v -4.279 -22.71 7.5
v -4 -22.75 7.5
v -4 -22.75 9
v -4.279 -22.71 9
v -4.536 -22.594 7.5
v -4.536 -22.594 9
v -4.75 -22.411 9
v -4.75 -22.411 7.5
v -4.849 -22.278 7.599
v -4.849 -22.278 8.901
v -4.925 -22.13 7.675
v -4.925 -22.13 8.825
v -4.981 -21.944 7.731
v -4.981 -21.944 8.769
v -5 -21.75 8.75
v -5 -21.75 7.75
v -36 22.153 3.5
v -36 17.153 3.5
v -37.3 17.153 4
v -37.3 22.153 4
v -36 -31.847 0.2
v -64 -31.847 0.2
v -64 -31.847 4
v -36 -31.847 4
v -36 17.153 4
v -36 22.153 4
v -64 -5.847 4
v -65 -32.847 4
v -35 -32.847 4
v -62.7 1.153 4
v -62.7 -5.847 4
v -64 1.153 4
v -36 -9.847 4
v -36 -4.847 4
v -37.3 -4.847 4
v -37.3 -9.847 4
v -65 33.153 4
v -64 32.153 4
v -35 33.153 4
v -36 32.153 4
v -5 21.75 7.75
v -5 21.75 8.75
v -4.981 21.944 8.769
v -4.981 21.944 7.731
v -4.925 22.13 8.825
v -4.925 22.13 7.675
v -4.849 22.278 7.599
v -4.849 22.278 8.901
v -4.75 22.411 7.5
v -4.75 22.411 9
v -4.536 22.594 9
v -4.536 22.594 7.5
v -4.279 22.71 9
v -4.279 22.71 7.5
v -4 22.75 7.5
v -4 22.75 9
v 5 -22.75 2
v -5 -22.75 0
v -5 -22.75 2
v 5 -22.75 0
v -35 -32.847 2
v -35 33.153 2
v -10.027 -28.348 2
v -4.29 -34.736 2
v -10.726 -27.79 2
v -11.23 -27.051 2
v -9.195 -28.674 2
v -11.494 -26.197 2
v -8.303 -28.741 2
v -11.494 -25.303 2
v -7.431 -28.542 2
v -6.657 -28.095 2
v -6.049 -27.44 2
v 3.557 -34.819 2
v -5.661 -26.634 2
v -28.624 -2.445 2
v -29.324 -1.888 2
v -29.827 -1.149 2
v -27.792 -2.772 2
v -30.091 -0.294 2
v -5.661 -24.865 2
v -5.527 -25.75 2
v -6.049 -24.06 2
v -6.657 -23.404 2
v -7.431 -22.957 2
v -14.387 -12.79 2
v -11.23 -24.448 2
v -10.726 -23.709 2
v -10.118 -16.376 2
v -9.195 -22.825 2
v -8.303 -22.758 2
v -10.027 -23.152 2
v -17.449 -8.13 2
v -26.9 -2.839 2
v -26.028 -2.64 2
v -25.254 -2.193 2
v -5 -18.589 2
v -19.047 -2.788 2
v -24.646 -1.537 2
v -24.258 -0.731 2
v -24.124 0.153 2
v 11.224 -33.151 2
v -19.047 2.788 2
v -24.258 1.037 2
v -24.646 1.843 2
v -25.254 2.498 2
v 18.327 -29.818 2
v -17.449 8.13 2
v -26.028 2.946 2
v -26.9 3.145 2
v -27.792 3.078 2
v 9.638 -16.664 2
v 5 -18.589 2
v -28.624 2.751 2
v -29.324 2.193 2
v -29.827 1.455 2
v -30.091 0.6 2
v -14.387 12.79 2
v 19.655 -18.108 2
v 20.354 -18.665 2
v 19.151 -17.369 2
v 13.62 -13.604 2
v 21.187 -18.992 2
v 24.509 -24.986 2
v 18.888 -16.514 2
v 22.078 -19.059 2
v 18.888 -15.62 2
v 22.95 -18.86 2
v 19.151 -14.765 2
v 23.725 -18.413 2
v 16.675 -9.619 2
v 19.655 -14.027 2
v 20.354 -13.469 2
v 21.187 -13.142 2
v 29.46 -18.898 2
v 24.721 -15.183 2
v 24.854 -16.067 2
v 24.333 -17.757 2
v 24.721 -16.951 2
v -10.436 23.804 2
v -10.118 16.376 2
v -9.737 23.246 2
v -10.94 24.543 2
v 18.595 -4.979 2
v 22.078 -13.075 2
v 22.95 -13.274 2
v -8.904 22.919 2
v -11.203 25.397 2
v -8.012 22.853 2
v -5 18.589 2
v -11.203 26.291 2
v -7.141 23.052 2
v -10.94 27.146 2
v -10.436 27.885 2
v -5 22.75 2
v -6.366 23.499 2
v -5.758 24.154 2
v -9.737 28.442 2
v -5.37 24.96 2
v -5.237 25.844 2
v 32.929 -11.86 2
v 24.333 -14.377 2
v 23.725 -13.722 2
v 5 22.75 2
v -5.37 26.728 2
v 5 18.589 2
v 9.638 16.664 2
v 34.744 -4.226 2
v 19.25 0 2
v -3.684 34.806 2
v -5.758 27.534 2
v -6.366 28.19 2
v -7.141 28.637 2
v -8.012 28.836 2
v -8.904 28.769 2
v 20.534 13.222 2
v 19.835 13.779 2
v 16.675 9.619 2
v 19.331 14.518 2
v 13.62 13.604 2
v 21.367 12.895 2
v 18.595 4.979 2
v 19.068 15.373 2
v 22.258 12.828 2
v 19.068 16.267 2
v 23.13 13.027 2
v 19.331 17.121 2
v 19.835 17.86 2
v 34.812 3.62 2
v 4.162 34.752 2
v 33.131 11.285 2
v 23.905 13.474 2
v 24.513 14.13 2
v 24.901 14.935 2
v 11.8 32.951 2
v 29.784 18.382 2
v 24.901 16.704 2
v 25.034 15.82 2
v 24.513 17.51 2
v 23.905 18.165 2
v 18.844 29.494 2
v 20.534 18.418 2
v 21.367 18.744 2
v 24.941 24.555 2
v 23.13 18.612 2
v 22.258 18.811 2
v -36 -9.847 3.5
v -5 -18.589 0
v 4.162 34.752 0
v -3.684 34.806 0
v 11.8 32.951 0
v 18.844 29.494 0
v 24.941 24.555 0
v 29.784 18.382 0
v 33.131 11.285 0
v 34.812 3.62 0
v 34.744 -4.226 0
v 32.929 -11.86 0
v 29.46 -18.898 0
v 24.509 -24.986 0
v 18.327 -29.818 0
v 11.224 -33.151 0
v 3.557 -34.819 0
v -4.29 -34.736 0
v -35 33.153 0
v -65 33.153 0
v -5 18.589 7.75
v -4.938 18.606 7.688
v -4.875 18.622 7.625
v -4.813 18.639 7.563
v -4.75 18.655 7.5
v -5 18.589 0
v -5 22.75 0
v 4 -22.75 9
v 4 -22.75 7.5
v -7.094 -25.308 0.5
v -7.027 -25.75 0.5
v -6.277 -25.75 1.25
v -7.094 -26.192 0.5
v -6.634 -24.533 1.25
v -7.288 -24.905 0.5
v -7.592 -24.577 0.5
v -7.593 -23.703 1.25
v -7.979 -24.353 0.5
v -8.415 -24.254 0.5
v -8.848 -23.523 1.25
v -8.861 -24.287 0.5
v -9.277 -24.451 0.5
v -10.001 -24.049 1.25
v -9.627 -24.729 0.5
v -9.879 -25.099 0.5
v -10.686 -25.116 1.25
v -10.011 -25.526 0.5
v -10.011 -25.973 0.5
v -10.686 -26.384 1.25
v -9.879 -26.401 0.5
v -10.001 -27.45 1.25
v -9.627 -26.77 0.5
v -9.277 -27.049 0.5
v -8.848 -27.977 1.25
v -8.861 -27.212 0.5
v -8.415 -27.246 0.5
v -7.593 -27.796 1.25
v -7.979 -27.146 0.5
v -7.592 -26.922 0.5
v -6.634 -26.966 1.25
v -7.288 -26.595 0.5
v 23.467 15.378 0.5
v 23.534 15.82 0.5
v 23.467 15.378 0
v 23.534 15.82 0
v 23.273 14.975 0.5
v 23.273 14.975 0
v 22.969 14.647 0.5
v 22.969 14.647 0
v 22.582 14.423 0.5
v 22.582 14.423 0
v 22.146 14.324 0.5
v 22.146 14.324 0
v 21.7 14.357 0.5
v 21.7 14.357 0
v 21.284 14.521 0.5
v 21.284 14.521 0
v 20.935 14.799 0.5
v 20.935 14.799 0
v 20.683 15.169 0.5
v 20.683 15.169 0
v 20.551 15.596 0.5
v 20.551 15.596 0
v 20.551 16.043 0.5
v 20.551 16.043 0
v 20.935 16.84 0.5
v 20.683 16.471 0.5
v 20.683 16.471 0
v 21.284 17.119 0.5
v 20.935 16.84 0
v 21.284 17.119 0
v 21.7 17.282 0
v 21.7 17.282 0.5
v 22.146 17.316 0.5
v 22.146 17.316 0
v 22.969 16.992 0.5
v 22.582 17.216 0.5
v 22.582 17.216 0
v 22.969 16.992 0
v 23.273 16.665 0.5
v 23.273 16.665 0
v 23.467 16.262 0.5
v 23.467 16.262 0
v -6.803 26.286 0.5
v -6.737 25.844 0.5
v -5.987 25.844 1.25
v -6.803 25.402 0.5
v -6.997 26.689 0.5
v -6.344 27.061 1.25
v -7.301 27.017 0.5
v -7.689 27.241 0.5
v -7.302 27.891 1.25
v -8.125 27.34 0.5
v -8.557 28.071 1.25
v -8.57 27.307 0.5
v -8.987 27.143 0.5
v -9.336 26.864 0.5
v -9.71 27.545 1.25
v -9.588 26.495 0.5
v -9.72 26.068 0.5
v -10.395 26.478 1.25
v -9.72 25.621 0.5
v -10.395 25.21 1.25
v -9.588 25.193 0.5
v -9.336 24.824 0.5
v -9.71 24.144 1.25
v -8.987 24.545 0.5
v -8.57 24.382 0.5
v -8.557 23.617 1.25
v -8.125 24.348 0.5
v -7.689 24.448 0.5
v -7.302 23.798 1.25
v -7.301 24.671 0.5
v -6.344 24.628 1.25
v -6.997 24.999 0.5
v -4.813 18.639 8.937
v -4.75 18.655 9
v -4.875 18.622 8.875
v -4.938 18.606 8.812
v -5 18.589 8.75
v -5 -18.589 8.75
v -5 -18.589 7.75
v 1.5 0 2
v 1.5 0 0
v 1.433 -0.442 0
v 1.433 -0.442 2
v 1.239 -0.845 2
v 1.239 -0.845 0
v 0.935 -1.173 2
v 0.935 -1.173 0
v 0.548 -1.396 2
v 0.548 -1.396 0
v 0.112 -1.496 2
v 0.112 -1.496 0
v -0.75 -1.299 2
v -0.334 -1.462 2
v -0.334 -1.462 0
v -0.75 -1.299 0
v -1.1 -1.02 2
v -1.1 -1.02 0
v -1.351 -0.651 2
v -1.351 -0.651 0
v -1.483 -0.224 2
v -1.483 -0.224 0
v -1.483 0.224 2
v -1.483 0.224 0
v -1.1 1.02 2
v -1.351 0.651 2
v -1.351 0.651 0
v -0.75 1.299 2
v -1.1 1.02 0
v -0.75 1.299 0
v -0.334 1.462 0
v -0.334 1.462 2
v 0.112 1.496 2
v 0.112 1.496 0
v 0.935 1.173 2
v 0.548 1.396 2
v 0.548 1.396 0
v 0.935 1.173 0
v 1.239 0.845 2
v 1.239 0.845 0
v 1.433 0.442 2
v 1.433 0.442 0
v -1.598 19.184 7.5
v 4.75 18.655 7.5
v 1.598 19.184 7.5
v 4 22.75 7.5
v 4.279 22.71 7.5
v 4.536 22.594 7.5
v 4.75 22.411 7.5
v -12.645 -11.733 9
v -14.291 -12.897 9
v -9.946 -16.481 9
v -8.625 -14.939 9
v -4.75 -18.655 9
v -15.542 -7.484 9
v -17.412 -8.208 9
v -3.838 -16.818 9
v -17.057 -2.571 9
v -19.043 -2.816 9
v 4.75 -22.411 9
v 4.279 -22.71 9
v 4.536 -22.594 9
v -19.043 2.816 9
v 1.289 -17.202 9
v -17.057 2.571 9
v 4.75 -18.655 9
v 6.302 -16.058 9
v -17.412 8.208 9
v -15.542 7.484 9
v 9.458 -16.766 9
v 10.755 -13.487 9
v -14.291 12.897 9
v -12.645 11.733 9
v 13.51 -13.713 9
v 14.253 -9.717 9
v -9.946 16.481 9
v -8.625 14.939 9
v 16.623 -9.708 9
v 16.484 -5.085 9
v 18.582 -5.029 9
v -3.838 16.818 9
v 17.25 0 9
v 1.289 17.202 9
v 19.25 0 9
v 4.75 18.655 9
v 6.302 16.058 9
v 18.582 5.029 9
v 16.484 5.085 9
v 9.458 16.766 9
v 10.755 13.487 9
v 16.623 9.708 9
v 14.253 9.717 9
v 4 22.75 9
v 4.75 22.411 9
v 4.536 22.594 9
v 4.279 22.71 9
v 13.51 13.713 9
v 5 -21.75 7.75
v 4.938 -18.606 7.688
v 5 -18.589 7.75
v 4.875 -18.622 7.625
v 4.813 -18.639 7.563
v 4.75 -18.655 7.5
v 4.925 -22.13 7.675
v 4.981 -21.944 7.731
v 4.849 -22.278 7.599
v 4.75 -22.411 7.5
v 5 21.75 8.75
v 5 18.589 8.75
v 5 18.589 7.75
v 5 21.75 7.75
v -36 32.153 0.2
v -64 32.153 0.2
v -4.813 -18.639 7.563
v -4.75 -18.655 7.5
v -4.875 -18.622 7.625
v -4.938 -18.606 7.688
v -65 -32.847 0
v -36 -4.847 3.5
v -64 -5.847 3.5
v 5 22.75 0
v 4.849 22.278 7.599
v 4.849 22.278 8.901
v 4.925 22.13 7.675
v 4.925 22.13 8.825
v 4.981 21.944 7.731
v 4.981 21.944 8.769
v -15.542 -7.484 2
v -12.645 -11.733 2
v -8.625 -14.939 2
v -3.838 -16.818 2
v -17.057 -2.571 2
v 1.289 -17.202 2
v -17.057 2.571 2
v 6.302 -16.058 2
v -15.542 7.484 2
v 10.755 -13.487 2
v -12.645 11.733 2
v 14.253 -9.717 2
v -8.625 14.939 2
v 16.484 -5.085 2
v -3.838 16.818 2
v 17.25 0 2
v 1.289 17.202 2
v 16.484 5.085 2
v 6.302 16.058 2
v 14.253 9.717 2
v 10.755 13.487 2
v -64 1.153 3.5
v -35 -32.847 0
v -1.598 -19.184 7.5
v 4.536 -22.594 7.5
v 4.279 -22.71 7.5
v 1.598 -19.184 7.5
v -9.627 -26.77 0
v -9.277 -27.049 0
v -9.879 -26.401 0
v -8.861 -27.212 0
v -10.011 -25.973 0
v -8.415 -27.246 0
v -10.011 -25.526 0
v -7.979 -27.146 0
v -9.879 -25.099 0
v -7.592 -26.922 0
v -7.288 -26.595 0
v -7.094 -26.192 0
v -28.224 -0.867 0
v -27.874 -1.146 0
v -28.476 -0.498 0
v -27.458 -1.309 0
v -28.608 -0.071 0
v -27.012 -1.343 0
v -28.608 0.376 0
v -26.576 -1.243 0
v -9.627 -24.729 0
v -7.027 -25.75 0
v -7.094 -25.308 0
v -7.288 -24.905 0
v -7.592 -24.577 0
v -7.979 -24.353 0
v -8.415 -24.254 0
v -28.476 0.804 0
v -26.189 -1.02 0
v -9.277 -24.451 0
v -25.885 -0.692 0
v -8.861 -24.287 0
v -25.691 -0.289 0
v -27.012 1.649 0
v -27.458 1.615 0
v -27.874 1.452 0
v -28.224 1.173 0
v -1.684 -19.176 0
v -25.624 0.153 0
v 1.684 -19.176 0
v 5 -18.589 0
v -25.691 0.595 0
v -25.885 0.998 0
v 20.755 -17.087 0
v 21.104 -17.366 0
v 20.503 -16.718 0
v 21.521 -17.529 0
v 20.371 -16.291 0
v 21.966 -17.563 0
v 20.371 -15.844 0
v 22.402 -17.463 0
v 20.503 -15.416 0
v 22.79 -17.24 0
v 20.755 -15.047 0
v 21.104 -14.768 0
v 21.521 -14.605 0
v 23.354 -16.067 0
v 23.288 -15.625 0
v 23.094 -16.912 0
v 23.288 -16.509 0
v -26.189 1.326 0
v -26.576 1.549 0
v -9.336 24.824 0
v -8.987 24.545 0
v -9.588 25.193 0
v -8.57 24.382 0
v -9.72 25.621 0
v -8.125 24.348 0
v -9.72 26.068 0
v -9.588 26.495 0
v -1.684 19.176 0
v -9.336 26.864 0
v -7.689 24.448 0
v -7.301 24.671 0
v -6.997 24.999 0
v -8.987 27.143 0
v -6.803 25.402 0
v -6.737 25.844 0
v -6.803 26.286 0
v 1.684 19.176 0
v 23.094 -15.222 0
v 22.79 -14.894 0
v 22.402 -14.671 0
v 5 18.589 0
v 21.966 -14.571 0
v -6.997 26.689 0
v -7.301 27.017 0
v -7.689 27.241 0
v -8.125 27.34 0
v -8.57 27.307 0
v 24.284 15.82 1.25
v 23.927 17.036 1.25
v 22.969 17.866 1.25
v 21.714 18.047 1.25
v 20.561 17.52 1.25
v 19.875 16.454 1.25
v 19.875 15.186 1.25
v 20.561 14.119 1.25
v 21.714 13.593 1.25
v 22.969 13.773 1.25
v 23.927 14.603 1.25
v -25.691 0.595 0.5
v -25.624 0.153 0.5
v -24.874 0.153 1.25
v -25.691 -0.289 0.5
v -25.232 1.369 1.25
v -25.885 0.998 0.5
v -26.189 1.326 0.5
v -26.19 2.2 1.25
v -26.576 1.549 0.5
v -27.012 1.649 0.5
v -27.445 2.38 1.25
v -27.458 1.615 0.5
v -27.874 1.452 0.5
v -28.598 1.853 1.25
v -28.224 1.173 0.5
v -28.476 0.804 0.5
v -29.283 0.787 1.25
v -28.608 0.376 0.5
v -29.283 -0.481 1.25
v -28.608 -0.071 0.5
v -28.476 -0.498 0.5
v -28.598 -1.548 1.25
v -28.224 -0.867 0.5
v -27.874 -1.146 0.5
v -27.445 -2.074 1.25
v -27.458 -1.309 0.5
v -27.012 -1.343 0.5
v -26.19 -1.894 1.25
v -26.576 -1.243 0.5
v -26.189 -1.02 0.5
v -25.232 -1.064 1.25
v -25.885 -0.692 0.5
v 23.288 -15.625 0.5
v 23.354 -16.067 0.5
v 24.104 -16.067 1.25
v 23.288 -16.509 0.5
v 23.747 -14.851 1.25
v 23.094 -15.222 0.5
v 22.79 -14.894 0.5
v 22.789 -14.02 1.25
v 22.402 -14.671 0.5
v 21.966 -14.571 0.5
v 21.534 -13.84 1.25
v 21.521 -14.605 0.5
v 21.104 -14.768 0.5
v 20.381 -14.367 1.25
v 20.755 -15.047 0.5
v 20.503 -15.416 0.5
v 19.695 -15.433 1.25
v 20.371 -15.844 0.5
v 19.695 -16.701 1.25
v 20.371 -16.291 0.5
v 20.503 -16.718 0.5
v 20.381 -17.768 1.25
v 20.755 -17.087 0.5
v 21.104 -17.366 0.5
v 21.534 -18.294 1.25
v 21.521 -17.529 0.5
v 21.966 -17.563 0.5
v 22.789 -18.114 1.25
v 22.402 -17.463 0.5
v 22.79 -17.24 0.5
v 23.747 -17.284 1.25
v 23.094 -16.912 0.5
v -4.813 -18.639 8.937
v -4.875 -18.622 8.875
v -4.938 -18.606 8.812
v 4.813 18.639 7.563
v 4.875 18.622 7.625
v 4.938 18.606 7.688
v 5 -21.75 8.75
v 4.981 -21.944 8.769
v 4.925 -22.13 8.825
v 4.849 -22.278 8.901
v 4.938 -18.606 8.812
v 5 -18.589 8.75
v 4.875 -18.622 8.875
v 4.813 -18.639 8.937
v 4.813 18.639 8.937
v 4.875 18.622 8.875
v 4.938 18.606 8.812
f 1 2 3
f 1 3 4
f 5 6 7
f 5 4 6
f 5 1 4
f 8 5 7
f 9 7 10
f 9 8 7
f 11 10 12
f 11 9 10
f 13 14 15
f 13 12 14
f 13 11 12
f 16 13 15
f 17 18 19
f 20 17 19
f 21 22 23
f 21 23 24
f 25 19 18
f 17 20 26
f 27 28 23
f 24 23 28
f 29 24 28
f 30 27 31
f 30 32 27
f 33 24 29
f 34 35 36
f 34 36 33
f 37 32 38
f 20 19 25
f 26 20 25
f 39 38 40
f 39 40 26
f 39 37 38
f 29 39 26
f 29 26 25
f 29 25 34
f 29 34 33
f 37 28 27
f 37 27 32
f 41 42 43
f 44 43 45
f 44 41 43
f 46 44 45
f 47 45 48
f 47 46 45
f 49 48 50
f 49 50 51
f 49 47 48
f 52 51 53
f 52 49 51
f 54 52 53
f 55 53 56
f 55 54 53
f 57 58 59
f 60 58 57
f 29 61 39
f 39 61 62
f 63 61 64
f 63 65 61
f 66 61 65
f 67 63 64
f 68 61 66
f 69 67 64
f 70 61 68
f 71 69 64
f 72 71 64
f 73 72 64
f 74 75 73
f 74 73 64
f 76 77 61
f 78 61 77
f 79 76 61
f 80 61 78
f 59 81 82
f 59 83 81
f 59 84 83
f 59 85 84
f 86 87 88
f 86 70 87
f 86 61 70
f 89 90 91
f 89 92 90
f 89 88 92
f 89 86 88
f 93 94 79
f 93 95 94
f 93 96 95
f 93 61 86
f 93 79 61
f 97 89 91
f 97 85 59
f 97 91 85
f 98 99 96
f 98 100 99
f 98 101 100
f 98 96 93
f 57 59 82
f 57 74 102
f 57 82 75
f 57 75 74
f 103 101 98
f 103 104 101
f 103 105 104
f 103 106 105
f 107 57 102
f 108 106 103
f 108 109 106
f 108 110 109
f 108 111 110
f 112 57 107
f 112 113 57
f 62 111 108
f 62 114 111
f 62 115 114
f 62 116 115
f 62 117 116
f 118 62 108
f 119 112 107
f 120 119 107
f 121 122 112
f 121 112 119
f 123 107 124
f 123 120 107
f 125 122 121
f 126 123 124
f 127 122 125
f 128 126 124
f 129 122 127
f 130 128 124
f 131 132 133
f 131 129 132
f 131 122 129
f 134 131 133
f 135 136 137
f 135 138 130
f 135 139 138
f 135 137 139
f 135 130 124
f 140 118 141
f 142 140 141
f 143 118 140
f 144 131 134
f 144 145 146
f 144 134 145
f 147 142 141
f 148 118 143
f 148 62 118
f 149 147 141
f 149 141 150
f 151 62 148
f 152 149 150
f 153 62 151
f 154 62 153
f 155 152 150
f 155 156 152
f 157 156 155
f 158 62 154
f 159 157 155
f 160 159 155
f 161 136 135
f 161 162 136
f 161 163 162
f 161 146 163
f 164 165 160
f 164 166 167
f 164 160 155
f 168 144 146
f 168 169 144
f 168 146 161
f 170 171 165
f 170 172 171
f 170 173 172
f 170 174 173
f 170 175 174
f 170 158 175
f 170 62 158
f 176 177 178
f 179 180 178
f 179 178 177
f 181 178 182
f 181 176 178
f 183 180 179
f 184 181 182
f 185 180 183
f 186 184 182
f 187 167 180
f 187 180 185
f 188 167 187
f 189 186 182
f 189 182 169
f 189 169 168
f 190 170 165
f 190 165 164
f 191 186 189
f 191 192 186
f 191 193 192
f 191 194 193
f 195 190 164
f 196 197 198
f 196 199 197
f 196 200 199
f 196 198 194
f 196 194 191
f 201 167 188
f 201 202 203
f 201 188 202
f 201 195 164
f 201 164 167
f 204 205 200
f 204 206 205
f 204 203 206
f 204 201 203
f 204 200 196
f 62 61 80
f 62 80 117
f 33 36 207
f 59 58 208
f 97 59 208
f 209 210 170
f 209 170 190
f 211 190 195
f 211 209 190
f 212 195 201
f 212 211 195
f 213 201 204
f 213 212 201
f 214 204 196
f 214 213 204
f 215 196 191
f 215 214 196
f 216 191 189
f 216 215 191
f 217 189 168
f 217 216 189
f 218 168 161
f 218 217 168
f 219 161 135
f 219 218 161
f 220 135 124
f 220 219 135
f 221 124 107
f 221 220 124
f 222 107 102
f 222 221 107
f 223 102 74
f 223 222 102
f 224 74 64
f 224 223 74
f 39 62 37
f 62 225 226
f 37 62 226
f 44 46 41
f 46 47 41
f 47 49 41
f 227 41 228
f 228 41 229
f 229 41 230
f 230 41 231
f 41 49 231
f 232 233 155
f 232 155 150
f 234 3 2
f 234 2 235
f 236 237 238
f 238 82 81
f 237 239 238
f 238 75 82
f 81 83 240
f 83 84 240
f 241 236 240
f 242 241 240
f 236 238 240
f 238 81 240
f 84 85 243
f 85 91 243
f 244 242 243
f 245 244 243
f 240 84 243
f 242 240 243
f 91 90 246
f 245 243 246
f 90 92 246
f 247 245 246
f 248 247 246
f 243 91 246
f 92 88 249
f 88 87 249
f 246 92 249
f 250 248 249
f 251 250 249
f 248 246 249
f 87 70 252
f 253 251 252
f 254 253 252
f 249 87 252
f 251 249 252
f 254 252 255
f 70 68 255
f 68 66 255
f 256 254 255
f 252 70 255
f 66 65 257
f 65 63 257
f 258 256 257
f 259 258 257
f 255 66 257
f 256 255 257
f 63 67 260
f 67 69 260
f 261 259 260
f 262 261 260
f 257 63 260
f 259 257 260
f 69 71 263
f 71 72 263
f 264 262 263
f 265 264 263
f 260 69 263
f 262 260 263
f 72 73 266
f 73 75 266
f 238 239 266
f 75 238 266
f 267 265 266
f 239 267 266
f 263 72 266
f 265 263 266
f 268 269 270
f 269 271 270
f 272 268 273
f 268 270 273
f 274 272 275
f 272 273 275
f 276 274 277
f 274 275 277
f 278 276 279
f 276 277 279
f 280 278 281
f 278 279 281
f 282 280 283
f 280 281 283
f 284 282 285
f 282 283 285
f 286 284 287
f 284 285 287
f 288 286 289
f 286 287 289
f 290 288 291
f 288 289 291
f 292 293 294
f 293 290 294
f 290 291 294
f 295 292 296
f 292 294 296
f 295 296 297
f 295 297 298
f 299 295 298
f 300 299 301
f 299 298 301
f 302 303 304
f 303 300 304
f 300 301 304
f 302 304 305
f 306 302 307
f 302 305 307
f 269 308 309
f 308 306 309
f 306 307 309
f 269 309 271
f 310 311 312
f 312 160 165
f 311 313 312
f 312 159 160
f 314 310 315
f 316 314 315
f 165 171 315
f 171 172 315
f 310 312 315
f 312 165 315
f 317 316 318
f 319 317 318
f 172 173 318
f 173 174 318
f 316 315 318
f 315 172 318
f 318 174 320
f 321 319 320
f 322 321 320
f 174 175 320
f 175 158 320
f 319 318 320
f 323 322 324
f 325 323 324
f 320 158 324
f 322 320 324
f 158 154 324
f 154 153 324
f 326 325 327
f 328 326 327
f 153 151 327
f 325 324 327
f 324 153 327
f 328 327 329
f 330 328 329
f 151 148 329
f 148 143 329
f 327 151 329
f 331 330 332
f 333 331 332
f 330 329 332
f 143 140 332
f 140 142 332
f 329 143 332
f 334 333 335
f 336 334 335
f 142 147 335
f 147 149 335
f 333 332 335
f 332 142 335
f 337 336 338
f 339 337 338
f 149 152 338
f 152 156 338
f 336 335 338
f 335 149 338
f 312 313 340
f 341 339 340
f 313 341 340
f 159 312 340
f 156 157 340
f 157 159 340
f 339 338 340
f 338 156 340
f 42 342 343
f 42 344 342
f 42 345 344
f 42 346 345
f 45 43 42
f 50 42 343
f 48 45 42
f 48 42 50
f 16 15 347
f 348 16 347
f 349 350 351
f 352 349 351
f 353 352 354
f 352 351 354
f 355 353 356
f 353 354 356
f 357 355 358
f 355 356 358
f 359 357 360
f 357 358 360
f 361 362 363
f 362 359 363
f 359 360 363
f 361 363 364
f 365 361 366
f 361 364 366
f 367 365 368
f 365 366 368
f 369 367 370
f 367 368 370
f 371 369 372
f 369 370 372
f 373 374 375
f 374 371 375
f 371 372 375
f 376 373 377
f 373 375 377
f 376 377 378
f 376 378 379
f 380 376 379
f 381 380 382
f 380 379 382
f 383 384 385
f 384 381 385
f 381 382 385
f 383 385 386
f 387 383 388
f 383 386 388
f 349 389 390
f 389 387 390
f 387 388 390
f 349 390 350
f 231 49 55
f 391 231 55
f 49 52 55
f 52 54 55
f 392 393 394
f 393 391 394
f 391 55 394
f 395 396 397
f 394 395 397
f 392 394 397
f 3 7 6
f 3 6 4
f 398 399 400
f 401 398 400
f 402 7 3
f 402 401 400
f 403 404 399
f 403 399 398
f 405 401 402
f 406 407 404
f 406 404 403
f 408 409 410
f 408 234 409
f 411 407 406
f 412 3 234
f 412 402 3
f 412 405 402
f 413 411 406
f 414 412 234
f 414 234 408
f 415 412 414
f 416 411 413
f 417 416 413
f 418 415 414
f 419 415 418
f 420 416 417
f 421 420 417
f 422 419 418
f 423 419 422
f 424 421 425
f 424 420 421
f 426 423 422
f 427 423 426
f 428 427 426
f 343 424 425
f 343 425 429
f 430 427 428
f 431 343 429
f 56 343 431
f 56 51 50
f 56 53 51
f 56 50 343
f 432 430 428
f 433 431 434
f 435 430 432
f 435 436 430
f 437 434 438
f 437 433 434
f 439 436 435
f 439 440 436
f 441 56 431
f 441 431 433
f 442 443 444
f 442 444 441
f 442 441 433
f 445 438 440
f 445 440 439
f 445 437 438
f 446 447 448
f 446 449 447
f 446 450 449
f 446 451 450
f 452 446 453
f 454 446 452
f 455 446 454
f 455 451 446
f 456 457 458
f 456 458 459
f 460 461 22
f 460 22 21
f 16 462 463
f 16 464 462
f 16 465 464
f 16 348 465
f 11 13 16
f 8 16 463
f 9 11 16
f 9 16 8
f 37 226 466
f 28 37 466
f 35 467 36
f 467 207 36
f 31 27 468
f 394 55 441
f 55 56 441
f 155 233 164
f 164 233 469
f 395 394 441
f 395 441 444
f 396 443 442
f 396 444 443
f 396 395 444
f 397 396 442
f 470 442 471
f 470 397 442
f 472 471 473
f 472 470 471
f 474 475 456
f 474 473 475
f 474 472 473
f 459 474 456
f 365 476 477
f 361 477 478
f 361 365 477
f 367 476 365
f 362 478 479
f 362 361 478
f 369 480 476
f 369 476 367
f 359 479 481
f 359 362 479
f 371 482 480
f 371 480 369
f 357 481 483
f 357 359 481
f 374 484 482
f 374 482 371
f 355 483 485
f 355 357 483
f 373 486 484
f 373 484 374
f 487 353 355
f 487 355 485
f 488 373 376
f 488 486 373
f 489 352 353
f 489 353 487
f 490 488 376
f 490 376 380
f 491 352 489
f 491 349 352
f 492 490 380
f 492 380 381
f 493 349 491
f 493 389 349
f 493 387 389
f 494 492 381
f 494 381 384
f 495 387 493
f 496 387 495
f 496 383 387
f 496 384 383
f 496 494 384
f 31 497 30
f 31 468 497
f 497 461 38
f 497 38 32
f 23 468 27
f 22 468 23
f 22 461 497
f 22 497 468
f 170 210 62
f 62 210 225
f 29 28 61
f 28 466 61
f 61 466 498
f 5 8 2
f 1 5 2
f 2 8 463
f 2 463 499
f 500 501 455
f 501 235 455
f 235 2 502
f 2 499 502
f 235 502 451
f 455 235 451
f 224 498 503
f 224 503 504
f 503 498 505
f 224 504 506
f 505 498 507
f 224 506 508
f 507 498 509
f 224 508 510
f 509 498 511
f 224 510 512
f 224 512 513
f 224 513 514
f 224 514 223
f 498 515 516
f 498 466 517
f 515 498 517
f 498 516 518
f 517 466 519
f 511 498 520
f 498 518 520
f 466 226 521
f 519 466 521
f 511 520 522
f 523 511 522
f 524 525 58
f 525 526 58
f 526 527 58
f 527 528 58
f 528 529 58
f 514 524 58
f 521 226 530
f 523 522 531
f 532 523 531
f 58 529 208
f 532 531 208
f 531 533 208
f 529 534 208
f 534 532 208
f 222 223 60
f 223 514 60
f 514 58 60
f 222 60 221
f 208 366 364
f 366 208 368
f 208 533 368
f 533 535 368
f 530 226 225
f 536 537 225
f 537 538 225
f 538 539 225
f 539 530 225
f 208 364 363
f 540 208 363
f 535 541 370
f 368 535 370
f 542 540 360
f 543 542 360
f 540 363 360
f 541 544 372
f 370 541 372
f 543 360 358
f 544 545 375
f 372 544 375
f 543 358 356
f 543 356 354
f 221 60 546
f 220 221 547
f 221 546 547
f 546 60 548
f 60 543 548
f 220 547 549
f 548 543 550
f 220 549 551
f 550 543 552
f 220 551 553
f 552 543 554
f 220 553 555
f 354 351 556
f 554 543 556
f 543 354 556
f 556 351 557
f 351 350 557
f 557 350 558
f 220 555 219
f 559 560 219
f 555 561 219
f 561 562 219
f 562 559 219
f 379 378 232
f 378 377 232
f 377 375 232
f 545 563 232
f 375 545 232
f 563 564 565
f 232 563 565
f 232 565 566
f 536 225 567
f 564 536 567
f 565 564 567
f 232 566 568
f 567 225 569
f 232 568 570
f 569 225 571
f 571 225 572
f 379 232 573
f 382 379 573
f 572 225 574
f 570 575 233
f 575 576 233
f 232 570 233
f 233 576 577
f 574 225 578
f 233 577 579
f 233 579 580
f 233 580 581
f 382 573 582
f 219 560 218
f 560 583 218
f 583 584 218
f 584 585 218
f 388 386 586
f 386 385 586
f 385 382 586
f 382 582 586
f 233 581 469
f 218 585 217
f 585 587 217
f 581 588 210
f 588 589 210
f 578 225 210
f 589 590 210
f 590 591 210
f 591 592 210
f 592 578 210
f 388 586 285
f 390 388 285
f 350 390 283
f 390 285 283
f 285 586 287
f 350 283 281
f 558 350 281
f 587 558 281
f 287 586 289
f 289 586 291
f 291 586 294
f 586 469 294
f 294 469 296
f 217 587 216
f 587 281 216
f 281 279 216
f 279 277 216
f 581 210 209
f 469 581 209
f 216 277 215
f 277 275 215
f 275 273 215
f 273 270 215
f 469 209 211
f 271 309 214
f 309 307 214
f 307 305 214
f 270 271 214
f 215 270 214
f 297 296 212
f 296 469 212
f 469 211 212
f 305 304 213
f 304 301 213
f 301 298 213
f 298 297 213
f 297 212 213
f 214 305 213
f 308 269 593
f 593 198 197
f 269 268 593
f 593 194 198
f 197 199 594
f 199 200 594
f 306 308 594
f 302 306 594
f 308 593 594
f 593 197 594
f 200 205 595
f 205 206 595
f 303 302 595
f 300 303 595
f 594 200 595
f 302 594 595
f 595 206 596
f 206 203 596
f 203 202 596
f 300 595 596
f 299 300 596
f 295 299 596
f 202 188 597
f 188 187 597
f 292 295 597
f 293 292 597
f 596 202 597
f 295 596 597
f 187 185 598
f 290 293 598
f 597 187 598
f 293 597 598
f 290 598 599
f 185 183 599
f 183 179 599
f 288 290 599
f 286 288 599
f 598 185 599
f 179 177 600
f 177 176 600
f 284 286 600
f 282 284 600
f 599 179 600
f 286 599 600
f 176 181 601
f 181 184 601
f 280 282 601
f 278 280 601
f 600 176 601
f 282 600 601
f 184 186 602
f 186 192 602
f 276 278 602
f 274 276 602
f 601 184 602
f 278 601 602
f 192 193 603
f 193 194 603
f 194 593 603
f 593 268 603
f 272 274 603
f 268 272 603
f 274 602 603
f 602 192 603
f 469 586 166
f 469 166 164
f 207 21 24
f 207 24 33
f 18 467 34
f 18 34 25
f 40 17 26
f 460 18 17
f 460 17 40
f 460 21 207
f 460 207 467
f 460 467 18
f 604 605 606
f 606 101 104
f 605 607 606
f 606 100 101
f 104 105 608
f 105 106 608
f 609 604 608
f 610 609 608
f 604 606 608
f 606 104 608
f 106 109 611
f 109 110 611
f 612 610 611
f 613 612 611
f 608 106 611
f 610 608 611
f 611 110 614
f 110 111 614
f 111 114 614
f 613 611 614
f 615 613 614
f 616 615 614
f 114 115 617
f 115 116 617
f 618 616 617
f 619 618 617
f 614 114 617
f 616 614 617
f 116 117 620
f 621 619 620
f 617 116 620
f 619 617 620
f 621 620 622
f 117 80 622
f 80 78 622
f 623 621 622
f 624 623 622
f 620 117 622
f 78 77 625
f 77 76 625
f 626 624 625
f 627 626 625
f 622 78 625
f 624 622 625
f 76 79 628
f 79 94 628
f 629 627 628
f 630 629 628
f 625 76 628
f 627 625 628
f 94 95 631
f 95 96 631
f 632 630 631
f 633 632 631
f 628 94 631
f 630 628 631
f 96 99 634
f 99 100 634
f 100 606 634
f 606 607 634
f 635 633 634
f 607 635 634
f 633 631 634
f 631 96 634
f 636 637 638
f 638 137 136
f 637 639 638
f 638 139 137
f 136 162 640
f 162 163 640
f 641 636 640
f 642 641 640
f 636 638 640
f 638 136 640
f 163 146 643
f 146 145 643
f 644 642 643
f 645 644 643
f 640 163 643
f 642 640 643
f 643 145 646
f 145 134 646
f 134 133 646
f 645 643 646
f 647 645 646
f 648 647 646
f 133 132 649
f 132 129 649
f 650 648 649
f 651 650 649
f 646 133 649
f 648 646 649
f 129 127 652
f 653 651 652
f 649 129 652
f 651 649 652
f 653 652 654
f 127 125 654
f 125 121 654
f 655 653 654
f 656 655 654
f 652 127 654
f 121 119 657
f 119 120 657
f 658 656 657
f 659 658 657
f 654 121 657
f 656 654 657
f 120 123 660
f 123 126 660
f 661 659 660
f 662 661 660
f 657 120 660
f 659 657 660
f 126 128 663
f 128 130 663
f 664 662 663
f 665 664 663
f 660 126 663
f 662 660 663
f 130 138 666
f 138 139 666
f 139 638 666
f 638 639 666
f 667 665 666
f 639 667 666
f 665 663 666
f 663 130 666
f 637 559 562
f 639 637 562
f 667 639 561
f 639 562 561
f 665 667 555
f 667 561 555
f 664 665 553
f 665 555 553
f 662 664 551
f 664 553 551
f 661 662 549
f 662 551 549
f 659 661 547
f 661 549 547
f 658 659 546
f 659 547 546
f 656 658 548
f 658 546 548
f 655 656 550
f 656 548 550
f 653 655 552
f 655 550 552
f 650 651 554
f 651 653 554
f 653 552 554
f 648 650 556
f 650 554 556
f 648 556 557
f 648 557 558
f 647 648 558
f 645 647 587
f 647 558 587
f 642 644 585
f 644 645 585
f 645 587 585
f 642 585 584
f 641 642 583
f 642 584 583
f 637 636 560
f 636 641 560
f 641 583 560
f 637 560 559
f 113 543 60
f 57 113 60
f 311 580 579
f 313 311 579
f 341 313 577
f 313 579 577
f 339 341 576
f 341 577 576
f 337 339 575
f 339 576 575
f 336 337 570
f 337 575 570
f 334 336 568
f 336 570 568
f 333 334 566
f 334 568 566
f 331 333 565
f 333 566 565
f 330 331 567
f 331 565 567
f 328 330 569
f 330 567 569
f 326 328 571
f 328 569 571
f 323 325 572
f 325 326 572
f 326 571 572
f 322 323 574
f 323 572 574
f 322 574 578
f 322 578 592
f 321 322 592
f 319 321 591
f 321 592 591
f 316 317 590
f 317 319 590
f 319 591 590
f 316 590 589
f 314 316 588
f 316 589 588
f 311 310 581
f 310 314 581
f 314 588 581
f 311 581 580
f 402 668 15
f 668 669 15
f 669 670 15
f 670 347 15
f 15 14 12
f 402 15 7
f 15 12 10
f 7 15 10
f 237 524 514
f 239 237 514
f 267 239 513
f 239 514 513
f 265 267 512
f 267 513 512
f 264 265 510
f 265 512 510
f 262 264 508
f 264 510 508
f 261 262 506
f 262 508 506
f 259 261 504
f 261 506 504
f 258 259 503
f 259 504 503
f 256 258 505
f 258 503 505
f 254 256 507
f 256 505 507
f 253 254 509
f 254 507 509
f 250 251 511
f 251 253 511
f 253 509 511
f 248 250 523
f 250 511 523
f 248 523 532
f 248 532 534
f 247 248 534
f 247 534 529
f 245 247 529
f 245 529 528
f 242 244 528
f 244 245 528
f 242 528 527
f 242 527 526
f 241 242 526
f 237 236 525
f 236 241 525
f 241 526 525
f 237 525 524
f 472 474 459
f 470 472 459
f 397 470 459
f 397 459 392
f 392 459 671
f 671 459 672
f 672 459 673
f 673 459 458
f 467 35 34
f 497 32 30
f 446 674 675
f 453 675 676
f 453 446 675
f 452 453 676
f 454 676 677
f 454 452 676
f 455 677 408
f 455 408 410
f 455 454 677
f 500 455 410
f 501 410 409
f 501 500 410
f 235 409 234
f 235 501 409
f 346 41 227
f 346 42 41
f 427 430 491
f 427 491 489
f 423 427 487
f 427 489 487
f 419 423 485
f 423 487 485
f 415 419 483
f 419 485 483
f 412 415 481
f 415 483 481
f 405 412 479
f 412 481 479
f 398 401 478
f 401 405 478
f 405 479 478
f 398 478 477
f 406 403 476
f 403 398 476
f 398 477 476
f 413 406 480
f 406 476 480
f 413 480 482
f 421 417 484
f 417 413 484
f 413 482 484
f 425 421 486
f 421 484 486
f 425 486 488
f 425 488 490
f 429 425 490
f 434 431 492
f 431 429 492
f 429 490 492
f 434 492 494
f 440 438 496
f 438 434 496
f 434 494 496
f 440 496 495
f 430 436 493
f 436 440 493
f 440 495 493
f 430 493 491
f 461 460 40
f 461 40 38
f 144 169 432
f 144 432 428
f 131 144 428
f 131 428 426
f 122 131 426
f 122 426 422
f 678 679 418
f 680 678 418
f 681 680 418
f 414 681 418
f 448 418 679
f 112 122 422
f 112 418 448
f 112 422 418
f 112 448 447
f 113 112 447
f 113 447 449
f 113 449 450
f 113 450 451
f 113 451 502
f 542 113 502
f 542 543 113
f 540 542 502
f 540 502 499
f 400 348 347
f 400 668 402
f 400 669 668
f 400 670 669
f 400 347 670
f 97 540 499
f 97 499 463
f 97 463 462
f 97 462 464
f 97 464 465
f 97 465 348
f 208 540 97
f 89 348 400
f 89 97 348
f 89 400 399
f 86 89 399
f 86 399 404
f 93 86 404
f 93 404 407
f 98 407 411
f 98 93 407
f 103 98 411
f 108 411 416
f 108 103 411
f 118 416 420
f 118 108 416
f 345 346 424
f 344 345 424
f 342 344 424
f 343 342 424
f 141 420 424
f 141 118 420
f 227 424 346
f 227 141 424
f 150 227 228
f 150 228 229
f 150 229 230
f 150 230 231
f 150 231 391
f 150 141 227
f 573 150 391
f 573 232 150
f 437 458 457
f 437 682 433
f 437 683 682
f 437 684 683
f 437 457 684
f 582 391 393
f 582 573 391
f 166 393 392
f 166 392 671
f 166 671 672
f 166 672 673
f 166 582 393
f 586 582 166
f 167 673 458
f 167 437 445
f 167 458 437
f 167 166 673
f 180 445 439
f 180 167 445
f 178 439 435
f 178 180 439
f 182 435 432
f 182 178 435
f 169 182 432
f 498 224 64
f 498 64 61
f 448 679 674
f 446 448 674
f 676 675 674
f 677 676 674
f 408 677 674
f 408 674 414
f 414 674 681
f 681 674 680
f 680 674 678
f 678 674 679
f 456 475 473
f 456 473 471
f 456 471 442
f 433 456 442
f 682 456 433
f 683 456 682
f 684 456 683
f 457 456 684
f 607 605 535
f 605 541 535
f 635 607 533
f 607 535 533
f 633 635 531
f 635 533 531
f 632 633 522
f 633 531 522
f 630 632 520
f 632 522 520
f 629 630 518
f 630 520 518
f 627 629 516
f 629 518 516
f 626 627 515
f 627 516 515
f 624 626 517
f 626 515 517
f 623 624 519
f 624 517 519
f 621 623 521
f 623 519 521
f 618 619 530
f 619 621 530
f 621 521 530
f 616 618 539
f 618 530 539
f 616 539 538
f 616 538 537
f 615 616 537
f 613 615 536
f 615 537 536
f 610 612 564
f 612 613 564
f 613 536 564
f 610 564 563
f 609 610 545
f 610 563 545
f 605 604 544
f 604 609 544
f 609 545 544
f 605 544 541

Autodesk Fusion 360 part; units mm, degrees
sketch "Sketch1" plane through (0, 0, 0) normal (0, 0, 1) x (1, 0, 0)
  circle A0 centre (0, 0) radius 17.25
  circle A1 centre (0, 0) radius 19.25
  line L0 (0, 19.25) -> (5, 19.25) construction
  line L1 (5, 19.25) -> (-5, 19.25) construction
  line L2 (-5, 19.25) -> (-5, 22.75) construction
  line L3 (-5, 22.75) -> (5, 22.75) construction
  line L4 (5, 22.75) -> (5, 19.25) construction
  line L5 (-5, 22.75) -> (-5, 18.5893)
  line L6 (-5, 22.75) -> (5, 22.75)
  line L7 (5, 18.5893) -> (5, 22.75)
  line L8 (0, 0) -> (17.25, 0) construction
  line L9 (-5, -22.75) -> (-5, -18.5893)
  line L10 (-5, -22.75) -> (5, -22.75)
  line L11 (5, -18.5893) -> (5, -22.75)
  circle A2 centre (0, 0) radius 1.5
  circle A3 centre (0, 0) radius 35
  line L12 (-19.2494, 0.1529) -> (-34.9997, 0.1529) construction
  circle A4 centre (-27.1245, 0.1529) radius 1.5
  circle A5 centre (-8.5273, -25.7497) radius 1.5
  circle A6 centre (21.8543, -16.0671) radius 1.5
  circle A7 centre (22.0341, 15.8197) radius 1.5
  circle A8 centre (-8.2366, 25.8442) radius 1.5
  line L13 (-34.9997, 0.1529) -> (-36, 0.1529) construction
  line L14 (-36, 0.1529) -> (-36, 32.1529) construction
  line L15 (-36, 32.1529) -> (-64, 32.1529)
  line L16 (-64, 32.1529) -> (-64, -31.8471)
  line L17 (-64, -31.8471) -> (-36, -31.8471)
  line L18 (-36, -31.8471) -> (-36, 32.1529)
  line L19 (-65, 33.1529) -> (-65, -32.8471)
  line L20 (-65, -32.8471) -> (-35, -32.8471)
  line L21 (-35, -32.8471) -> (-35, 33.1529)
  line L22 (-35, 33.1529) -> (-65, 33.1529)
  line L23 (0, -35) -> (-35, -32.8471)
  line L24 (0, 35) -> (-35, 33.1529)
  dimension "d1" = 34.5
  dimension "d2" = 2
  dimension "d3" = 5
  dimension "d4" = 10
  dimension "d5" = 3.5
  dimension "d6" = 3
  dimension "d17" = 70
  dimension "d18" = 3
  dimension "d20" = 360
  dimension "d24" = 32
  dimension "d25" = 28
  dimension "d26" = 64
  dimension "d27" = 1
extrude "Extrude1" add sketch "Sketch1" along normal blind 9 contours A1
extrude "Extrude2" add sketch "Sketch1" along normal blind 2 contours A0 | A3 L23 L24 | A3 L24 | A3 L23 | A3 L21 L24 | A3 L21 L23
extrude "Extrude3" add sketch "Sketch1" against normal blind 1.5 from surface at 9 contours A1 L5 L6 L7 | A1 L9 L10 L11
chamfer "Chamfer1" distance 0.25 angle 45 4 edges at (-5, 20.6697, 9) (5, 20.6697, 9) (5, -20.6697, 9) (-5, -20.6697, 9)
chamfer "Chamfer2" distance 0.25 angle 45 4 edges at (5, -20.6697, 7.5) (-5, -20.6697, 7.5) (-5, 20.6697, 7.5) (5, 20.6697, 7.5)
chamfer "Chamfer4" distance 1.5 angle 45 5 edges at (-28.523, 0.6953, 2) (20.6356, 16.3621, 2) (20.4559, -15.5247, 2) (-9.9258, -25.2073, 2) (-9.635, 26.3866, 2)
fillet "Fillet1" radius 1 4 edges at (5, 22.75, 8.25) (-5, 22.75, 8.25) (-5, -22.75, 8.25) (5, -22.75, 8.25)
extrude "Extrude4" add sketch "Sketch1" along normal blind 4 contours L19 L20 L21 L22
sketch "Sketch2" plane through (0, -32.8471, 0) normal (0, -1, 0) x (1, 0, 0)
  line L0 (-65, 0) -> (-35, 0)
  line L1 (-35, 0) -> (-35, 2)
  line L2 (-35, 2) -> (-35, 4)
  line L3 (-35, 4) -> (-65, 4)
  line L4 (-65, 4) -> (-65, 0)
  line L5 (-35, 4) -> (-35, 0) construction
  line L6 (-36, 3.5) -> (-37.3, 4)
  line L7 (-37.3, 4) -> (-36, 4)
  line L8 (-36, 3.5) -> (-36, 4)
  line L9 (-64, 3.5) -> (-62.7, 4)
  line L10 (-62.7, 4) -> (-64, 4)
  line L11 (-64, 3.5) -> (-64, 4)
extrude "Extrude5" add sketch "Sketch2" against normal blind 7 from surface at -27 contours L3 L9 L10 L11
extrude "Extrude6" add sketch "Sketch2" against normal blind 5 from surface at -23 contours L3 L6 L7 L8
extrude "Extrude8" add sketch "Sketch1" along normal blind 0.2 contours L15 L16 L17 L18
extrude "Extrude9" add sketch "Sketch2" against normal blind 5 from surface at -50 contours L3 L6 L7 L8
